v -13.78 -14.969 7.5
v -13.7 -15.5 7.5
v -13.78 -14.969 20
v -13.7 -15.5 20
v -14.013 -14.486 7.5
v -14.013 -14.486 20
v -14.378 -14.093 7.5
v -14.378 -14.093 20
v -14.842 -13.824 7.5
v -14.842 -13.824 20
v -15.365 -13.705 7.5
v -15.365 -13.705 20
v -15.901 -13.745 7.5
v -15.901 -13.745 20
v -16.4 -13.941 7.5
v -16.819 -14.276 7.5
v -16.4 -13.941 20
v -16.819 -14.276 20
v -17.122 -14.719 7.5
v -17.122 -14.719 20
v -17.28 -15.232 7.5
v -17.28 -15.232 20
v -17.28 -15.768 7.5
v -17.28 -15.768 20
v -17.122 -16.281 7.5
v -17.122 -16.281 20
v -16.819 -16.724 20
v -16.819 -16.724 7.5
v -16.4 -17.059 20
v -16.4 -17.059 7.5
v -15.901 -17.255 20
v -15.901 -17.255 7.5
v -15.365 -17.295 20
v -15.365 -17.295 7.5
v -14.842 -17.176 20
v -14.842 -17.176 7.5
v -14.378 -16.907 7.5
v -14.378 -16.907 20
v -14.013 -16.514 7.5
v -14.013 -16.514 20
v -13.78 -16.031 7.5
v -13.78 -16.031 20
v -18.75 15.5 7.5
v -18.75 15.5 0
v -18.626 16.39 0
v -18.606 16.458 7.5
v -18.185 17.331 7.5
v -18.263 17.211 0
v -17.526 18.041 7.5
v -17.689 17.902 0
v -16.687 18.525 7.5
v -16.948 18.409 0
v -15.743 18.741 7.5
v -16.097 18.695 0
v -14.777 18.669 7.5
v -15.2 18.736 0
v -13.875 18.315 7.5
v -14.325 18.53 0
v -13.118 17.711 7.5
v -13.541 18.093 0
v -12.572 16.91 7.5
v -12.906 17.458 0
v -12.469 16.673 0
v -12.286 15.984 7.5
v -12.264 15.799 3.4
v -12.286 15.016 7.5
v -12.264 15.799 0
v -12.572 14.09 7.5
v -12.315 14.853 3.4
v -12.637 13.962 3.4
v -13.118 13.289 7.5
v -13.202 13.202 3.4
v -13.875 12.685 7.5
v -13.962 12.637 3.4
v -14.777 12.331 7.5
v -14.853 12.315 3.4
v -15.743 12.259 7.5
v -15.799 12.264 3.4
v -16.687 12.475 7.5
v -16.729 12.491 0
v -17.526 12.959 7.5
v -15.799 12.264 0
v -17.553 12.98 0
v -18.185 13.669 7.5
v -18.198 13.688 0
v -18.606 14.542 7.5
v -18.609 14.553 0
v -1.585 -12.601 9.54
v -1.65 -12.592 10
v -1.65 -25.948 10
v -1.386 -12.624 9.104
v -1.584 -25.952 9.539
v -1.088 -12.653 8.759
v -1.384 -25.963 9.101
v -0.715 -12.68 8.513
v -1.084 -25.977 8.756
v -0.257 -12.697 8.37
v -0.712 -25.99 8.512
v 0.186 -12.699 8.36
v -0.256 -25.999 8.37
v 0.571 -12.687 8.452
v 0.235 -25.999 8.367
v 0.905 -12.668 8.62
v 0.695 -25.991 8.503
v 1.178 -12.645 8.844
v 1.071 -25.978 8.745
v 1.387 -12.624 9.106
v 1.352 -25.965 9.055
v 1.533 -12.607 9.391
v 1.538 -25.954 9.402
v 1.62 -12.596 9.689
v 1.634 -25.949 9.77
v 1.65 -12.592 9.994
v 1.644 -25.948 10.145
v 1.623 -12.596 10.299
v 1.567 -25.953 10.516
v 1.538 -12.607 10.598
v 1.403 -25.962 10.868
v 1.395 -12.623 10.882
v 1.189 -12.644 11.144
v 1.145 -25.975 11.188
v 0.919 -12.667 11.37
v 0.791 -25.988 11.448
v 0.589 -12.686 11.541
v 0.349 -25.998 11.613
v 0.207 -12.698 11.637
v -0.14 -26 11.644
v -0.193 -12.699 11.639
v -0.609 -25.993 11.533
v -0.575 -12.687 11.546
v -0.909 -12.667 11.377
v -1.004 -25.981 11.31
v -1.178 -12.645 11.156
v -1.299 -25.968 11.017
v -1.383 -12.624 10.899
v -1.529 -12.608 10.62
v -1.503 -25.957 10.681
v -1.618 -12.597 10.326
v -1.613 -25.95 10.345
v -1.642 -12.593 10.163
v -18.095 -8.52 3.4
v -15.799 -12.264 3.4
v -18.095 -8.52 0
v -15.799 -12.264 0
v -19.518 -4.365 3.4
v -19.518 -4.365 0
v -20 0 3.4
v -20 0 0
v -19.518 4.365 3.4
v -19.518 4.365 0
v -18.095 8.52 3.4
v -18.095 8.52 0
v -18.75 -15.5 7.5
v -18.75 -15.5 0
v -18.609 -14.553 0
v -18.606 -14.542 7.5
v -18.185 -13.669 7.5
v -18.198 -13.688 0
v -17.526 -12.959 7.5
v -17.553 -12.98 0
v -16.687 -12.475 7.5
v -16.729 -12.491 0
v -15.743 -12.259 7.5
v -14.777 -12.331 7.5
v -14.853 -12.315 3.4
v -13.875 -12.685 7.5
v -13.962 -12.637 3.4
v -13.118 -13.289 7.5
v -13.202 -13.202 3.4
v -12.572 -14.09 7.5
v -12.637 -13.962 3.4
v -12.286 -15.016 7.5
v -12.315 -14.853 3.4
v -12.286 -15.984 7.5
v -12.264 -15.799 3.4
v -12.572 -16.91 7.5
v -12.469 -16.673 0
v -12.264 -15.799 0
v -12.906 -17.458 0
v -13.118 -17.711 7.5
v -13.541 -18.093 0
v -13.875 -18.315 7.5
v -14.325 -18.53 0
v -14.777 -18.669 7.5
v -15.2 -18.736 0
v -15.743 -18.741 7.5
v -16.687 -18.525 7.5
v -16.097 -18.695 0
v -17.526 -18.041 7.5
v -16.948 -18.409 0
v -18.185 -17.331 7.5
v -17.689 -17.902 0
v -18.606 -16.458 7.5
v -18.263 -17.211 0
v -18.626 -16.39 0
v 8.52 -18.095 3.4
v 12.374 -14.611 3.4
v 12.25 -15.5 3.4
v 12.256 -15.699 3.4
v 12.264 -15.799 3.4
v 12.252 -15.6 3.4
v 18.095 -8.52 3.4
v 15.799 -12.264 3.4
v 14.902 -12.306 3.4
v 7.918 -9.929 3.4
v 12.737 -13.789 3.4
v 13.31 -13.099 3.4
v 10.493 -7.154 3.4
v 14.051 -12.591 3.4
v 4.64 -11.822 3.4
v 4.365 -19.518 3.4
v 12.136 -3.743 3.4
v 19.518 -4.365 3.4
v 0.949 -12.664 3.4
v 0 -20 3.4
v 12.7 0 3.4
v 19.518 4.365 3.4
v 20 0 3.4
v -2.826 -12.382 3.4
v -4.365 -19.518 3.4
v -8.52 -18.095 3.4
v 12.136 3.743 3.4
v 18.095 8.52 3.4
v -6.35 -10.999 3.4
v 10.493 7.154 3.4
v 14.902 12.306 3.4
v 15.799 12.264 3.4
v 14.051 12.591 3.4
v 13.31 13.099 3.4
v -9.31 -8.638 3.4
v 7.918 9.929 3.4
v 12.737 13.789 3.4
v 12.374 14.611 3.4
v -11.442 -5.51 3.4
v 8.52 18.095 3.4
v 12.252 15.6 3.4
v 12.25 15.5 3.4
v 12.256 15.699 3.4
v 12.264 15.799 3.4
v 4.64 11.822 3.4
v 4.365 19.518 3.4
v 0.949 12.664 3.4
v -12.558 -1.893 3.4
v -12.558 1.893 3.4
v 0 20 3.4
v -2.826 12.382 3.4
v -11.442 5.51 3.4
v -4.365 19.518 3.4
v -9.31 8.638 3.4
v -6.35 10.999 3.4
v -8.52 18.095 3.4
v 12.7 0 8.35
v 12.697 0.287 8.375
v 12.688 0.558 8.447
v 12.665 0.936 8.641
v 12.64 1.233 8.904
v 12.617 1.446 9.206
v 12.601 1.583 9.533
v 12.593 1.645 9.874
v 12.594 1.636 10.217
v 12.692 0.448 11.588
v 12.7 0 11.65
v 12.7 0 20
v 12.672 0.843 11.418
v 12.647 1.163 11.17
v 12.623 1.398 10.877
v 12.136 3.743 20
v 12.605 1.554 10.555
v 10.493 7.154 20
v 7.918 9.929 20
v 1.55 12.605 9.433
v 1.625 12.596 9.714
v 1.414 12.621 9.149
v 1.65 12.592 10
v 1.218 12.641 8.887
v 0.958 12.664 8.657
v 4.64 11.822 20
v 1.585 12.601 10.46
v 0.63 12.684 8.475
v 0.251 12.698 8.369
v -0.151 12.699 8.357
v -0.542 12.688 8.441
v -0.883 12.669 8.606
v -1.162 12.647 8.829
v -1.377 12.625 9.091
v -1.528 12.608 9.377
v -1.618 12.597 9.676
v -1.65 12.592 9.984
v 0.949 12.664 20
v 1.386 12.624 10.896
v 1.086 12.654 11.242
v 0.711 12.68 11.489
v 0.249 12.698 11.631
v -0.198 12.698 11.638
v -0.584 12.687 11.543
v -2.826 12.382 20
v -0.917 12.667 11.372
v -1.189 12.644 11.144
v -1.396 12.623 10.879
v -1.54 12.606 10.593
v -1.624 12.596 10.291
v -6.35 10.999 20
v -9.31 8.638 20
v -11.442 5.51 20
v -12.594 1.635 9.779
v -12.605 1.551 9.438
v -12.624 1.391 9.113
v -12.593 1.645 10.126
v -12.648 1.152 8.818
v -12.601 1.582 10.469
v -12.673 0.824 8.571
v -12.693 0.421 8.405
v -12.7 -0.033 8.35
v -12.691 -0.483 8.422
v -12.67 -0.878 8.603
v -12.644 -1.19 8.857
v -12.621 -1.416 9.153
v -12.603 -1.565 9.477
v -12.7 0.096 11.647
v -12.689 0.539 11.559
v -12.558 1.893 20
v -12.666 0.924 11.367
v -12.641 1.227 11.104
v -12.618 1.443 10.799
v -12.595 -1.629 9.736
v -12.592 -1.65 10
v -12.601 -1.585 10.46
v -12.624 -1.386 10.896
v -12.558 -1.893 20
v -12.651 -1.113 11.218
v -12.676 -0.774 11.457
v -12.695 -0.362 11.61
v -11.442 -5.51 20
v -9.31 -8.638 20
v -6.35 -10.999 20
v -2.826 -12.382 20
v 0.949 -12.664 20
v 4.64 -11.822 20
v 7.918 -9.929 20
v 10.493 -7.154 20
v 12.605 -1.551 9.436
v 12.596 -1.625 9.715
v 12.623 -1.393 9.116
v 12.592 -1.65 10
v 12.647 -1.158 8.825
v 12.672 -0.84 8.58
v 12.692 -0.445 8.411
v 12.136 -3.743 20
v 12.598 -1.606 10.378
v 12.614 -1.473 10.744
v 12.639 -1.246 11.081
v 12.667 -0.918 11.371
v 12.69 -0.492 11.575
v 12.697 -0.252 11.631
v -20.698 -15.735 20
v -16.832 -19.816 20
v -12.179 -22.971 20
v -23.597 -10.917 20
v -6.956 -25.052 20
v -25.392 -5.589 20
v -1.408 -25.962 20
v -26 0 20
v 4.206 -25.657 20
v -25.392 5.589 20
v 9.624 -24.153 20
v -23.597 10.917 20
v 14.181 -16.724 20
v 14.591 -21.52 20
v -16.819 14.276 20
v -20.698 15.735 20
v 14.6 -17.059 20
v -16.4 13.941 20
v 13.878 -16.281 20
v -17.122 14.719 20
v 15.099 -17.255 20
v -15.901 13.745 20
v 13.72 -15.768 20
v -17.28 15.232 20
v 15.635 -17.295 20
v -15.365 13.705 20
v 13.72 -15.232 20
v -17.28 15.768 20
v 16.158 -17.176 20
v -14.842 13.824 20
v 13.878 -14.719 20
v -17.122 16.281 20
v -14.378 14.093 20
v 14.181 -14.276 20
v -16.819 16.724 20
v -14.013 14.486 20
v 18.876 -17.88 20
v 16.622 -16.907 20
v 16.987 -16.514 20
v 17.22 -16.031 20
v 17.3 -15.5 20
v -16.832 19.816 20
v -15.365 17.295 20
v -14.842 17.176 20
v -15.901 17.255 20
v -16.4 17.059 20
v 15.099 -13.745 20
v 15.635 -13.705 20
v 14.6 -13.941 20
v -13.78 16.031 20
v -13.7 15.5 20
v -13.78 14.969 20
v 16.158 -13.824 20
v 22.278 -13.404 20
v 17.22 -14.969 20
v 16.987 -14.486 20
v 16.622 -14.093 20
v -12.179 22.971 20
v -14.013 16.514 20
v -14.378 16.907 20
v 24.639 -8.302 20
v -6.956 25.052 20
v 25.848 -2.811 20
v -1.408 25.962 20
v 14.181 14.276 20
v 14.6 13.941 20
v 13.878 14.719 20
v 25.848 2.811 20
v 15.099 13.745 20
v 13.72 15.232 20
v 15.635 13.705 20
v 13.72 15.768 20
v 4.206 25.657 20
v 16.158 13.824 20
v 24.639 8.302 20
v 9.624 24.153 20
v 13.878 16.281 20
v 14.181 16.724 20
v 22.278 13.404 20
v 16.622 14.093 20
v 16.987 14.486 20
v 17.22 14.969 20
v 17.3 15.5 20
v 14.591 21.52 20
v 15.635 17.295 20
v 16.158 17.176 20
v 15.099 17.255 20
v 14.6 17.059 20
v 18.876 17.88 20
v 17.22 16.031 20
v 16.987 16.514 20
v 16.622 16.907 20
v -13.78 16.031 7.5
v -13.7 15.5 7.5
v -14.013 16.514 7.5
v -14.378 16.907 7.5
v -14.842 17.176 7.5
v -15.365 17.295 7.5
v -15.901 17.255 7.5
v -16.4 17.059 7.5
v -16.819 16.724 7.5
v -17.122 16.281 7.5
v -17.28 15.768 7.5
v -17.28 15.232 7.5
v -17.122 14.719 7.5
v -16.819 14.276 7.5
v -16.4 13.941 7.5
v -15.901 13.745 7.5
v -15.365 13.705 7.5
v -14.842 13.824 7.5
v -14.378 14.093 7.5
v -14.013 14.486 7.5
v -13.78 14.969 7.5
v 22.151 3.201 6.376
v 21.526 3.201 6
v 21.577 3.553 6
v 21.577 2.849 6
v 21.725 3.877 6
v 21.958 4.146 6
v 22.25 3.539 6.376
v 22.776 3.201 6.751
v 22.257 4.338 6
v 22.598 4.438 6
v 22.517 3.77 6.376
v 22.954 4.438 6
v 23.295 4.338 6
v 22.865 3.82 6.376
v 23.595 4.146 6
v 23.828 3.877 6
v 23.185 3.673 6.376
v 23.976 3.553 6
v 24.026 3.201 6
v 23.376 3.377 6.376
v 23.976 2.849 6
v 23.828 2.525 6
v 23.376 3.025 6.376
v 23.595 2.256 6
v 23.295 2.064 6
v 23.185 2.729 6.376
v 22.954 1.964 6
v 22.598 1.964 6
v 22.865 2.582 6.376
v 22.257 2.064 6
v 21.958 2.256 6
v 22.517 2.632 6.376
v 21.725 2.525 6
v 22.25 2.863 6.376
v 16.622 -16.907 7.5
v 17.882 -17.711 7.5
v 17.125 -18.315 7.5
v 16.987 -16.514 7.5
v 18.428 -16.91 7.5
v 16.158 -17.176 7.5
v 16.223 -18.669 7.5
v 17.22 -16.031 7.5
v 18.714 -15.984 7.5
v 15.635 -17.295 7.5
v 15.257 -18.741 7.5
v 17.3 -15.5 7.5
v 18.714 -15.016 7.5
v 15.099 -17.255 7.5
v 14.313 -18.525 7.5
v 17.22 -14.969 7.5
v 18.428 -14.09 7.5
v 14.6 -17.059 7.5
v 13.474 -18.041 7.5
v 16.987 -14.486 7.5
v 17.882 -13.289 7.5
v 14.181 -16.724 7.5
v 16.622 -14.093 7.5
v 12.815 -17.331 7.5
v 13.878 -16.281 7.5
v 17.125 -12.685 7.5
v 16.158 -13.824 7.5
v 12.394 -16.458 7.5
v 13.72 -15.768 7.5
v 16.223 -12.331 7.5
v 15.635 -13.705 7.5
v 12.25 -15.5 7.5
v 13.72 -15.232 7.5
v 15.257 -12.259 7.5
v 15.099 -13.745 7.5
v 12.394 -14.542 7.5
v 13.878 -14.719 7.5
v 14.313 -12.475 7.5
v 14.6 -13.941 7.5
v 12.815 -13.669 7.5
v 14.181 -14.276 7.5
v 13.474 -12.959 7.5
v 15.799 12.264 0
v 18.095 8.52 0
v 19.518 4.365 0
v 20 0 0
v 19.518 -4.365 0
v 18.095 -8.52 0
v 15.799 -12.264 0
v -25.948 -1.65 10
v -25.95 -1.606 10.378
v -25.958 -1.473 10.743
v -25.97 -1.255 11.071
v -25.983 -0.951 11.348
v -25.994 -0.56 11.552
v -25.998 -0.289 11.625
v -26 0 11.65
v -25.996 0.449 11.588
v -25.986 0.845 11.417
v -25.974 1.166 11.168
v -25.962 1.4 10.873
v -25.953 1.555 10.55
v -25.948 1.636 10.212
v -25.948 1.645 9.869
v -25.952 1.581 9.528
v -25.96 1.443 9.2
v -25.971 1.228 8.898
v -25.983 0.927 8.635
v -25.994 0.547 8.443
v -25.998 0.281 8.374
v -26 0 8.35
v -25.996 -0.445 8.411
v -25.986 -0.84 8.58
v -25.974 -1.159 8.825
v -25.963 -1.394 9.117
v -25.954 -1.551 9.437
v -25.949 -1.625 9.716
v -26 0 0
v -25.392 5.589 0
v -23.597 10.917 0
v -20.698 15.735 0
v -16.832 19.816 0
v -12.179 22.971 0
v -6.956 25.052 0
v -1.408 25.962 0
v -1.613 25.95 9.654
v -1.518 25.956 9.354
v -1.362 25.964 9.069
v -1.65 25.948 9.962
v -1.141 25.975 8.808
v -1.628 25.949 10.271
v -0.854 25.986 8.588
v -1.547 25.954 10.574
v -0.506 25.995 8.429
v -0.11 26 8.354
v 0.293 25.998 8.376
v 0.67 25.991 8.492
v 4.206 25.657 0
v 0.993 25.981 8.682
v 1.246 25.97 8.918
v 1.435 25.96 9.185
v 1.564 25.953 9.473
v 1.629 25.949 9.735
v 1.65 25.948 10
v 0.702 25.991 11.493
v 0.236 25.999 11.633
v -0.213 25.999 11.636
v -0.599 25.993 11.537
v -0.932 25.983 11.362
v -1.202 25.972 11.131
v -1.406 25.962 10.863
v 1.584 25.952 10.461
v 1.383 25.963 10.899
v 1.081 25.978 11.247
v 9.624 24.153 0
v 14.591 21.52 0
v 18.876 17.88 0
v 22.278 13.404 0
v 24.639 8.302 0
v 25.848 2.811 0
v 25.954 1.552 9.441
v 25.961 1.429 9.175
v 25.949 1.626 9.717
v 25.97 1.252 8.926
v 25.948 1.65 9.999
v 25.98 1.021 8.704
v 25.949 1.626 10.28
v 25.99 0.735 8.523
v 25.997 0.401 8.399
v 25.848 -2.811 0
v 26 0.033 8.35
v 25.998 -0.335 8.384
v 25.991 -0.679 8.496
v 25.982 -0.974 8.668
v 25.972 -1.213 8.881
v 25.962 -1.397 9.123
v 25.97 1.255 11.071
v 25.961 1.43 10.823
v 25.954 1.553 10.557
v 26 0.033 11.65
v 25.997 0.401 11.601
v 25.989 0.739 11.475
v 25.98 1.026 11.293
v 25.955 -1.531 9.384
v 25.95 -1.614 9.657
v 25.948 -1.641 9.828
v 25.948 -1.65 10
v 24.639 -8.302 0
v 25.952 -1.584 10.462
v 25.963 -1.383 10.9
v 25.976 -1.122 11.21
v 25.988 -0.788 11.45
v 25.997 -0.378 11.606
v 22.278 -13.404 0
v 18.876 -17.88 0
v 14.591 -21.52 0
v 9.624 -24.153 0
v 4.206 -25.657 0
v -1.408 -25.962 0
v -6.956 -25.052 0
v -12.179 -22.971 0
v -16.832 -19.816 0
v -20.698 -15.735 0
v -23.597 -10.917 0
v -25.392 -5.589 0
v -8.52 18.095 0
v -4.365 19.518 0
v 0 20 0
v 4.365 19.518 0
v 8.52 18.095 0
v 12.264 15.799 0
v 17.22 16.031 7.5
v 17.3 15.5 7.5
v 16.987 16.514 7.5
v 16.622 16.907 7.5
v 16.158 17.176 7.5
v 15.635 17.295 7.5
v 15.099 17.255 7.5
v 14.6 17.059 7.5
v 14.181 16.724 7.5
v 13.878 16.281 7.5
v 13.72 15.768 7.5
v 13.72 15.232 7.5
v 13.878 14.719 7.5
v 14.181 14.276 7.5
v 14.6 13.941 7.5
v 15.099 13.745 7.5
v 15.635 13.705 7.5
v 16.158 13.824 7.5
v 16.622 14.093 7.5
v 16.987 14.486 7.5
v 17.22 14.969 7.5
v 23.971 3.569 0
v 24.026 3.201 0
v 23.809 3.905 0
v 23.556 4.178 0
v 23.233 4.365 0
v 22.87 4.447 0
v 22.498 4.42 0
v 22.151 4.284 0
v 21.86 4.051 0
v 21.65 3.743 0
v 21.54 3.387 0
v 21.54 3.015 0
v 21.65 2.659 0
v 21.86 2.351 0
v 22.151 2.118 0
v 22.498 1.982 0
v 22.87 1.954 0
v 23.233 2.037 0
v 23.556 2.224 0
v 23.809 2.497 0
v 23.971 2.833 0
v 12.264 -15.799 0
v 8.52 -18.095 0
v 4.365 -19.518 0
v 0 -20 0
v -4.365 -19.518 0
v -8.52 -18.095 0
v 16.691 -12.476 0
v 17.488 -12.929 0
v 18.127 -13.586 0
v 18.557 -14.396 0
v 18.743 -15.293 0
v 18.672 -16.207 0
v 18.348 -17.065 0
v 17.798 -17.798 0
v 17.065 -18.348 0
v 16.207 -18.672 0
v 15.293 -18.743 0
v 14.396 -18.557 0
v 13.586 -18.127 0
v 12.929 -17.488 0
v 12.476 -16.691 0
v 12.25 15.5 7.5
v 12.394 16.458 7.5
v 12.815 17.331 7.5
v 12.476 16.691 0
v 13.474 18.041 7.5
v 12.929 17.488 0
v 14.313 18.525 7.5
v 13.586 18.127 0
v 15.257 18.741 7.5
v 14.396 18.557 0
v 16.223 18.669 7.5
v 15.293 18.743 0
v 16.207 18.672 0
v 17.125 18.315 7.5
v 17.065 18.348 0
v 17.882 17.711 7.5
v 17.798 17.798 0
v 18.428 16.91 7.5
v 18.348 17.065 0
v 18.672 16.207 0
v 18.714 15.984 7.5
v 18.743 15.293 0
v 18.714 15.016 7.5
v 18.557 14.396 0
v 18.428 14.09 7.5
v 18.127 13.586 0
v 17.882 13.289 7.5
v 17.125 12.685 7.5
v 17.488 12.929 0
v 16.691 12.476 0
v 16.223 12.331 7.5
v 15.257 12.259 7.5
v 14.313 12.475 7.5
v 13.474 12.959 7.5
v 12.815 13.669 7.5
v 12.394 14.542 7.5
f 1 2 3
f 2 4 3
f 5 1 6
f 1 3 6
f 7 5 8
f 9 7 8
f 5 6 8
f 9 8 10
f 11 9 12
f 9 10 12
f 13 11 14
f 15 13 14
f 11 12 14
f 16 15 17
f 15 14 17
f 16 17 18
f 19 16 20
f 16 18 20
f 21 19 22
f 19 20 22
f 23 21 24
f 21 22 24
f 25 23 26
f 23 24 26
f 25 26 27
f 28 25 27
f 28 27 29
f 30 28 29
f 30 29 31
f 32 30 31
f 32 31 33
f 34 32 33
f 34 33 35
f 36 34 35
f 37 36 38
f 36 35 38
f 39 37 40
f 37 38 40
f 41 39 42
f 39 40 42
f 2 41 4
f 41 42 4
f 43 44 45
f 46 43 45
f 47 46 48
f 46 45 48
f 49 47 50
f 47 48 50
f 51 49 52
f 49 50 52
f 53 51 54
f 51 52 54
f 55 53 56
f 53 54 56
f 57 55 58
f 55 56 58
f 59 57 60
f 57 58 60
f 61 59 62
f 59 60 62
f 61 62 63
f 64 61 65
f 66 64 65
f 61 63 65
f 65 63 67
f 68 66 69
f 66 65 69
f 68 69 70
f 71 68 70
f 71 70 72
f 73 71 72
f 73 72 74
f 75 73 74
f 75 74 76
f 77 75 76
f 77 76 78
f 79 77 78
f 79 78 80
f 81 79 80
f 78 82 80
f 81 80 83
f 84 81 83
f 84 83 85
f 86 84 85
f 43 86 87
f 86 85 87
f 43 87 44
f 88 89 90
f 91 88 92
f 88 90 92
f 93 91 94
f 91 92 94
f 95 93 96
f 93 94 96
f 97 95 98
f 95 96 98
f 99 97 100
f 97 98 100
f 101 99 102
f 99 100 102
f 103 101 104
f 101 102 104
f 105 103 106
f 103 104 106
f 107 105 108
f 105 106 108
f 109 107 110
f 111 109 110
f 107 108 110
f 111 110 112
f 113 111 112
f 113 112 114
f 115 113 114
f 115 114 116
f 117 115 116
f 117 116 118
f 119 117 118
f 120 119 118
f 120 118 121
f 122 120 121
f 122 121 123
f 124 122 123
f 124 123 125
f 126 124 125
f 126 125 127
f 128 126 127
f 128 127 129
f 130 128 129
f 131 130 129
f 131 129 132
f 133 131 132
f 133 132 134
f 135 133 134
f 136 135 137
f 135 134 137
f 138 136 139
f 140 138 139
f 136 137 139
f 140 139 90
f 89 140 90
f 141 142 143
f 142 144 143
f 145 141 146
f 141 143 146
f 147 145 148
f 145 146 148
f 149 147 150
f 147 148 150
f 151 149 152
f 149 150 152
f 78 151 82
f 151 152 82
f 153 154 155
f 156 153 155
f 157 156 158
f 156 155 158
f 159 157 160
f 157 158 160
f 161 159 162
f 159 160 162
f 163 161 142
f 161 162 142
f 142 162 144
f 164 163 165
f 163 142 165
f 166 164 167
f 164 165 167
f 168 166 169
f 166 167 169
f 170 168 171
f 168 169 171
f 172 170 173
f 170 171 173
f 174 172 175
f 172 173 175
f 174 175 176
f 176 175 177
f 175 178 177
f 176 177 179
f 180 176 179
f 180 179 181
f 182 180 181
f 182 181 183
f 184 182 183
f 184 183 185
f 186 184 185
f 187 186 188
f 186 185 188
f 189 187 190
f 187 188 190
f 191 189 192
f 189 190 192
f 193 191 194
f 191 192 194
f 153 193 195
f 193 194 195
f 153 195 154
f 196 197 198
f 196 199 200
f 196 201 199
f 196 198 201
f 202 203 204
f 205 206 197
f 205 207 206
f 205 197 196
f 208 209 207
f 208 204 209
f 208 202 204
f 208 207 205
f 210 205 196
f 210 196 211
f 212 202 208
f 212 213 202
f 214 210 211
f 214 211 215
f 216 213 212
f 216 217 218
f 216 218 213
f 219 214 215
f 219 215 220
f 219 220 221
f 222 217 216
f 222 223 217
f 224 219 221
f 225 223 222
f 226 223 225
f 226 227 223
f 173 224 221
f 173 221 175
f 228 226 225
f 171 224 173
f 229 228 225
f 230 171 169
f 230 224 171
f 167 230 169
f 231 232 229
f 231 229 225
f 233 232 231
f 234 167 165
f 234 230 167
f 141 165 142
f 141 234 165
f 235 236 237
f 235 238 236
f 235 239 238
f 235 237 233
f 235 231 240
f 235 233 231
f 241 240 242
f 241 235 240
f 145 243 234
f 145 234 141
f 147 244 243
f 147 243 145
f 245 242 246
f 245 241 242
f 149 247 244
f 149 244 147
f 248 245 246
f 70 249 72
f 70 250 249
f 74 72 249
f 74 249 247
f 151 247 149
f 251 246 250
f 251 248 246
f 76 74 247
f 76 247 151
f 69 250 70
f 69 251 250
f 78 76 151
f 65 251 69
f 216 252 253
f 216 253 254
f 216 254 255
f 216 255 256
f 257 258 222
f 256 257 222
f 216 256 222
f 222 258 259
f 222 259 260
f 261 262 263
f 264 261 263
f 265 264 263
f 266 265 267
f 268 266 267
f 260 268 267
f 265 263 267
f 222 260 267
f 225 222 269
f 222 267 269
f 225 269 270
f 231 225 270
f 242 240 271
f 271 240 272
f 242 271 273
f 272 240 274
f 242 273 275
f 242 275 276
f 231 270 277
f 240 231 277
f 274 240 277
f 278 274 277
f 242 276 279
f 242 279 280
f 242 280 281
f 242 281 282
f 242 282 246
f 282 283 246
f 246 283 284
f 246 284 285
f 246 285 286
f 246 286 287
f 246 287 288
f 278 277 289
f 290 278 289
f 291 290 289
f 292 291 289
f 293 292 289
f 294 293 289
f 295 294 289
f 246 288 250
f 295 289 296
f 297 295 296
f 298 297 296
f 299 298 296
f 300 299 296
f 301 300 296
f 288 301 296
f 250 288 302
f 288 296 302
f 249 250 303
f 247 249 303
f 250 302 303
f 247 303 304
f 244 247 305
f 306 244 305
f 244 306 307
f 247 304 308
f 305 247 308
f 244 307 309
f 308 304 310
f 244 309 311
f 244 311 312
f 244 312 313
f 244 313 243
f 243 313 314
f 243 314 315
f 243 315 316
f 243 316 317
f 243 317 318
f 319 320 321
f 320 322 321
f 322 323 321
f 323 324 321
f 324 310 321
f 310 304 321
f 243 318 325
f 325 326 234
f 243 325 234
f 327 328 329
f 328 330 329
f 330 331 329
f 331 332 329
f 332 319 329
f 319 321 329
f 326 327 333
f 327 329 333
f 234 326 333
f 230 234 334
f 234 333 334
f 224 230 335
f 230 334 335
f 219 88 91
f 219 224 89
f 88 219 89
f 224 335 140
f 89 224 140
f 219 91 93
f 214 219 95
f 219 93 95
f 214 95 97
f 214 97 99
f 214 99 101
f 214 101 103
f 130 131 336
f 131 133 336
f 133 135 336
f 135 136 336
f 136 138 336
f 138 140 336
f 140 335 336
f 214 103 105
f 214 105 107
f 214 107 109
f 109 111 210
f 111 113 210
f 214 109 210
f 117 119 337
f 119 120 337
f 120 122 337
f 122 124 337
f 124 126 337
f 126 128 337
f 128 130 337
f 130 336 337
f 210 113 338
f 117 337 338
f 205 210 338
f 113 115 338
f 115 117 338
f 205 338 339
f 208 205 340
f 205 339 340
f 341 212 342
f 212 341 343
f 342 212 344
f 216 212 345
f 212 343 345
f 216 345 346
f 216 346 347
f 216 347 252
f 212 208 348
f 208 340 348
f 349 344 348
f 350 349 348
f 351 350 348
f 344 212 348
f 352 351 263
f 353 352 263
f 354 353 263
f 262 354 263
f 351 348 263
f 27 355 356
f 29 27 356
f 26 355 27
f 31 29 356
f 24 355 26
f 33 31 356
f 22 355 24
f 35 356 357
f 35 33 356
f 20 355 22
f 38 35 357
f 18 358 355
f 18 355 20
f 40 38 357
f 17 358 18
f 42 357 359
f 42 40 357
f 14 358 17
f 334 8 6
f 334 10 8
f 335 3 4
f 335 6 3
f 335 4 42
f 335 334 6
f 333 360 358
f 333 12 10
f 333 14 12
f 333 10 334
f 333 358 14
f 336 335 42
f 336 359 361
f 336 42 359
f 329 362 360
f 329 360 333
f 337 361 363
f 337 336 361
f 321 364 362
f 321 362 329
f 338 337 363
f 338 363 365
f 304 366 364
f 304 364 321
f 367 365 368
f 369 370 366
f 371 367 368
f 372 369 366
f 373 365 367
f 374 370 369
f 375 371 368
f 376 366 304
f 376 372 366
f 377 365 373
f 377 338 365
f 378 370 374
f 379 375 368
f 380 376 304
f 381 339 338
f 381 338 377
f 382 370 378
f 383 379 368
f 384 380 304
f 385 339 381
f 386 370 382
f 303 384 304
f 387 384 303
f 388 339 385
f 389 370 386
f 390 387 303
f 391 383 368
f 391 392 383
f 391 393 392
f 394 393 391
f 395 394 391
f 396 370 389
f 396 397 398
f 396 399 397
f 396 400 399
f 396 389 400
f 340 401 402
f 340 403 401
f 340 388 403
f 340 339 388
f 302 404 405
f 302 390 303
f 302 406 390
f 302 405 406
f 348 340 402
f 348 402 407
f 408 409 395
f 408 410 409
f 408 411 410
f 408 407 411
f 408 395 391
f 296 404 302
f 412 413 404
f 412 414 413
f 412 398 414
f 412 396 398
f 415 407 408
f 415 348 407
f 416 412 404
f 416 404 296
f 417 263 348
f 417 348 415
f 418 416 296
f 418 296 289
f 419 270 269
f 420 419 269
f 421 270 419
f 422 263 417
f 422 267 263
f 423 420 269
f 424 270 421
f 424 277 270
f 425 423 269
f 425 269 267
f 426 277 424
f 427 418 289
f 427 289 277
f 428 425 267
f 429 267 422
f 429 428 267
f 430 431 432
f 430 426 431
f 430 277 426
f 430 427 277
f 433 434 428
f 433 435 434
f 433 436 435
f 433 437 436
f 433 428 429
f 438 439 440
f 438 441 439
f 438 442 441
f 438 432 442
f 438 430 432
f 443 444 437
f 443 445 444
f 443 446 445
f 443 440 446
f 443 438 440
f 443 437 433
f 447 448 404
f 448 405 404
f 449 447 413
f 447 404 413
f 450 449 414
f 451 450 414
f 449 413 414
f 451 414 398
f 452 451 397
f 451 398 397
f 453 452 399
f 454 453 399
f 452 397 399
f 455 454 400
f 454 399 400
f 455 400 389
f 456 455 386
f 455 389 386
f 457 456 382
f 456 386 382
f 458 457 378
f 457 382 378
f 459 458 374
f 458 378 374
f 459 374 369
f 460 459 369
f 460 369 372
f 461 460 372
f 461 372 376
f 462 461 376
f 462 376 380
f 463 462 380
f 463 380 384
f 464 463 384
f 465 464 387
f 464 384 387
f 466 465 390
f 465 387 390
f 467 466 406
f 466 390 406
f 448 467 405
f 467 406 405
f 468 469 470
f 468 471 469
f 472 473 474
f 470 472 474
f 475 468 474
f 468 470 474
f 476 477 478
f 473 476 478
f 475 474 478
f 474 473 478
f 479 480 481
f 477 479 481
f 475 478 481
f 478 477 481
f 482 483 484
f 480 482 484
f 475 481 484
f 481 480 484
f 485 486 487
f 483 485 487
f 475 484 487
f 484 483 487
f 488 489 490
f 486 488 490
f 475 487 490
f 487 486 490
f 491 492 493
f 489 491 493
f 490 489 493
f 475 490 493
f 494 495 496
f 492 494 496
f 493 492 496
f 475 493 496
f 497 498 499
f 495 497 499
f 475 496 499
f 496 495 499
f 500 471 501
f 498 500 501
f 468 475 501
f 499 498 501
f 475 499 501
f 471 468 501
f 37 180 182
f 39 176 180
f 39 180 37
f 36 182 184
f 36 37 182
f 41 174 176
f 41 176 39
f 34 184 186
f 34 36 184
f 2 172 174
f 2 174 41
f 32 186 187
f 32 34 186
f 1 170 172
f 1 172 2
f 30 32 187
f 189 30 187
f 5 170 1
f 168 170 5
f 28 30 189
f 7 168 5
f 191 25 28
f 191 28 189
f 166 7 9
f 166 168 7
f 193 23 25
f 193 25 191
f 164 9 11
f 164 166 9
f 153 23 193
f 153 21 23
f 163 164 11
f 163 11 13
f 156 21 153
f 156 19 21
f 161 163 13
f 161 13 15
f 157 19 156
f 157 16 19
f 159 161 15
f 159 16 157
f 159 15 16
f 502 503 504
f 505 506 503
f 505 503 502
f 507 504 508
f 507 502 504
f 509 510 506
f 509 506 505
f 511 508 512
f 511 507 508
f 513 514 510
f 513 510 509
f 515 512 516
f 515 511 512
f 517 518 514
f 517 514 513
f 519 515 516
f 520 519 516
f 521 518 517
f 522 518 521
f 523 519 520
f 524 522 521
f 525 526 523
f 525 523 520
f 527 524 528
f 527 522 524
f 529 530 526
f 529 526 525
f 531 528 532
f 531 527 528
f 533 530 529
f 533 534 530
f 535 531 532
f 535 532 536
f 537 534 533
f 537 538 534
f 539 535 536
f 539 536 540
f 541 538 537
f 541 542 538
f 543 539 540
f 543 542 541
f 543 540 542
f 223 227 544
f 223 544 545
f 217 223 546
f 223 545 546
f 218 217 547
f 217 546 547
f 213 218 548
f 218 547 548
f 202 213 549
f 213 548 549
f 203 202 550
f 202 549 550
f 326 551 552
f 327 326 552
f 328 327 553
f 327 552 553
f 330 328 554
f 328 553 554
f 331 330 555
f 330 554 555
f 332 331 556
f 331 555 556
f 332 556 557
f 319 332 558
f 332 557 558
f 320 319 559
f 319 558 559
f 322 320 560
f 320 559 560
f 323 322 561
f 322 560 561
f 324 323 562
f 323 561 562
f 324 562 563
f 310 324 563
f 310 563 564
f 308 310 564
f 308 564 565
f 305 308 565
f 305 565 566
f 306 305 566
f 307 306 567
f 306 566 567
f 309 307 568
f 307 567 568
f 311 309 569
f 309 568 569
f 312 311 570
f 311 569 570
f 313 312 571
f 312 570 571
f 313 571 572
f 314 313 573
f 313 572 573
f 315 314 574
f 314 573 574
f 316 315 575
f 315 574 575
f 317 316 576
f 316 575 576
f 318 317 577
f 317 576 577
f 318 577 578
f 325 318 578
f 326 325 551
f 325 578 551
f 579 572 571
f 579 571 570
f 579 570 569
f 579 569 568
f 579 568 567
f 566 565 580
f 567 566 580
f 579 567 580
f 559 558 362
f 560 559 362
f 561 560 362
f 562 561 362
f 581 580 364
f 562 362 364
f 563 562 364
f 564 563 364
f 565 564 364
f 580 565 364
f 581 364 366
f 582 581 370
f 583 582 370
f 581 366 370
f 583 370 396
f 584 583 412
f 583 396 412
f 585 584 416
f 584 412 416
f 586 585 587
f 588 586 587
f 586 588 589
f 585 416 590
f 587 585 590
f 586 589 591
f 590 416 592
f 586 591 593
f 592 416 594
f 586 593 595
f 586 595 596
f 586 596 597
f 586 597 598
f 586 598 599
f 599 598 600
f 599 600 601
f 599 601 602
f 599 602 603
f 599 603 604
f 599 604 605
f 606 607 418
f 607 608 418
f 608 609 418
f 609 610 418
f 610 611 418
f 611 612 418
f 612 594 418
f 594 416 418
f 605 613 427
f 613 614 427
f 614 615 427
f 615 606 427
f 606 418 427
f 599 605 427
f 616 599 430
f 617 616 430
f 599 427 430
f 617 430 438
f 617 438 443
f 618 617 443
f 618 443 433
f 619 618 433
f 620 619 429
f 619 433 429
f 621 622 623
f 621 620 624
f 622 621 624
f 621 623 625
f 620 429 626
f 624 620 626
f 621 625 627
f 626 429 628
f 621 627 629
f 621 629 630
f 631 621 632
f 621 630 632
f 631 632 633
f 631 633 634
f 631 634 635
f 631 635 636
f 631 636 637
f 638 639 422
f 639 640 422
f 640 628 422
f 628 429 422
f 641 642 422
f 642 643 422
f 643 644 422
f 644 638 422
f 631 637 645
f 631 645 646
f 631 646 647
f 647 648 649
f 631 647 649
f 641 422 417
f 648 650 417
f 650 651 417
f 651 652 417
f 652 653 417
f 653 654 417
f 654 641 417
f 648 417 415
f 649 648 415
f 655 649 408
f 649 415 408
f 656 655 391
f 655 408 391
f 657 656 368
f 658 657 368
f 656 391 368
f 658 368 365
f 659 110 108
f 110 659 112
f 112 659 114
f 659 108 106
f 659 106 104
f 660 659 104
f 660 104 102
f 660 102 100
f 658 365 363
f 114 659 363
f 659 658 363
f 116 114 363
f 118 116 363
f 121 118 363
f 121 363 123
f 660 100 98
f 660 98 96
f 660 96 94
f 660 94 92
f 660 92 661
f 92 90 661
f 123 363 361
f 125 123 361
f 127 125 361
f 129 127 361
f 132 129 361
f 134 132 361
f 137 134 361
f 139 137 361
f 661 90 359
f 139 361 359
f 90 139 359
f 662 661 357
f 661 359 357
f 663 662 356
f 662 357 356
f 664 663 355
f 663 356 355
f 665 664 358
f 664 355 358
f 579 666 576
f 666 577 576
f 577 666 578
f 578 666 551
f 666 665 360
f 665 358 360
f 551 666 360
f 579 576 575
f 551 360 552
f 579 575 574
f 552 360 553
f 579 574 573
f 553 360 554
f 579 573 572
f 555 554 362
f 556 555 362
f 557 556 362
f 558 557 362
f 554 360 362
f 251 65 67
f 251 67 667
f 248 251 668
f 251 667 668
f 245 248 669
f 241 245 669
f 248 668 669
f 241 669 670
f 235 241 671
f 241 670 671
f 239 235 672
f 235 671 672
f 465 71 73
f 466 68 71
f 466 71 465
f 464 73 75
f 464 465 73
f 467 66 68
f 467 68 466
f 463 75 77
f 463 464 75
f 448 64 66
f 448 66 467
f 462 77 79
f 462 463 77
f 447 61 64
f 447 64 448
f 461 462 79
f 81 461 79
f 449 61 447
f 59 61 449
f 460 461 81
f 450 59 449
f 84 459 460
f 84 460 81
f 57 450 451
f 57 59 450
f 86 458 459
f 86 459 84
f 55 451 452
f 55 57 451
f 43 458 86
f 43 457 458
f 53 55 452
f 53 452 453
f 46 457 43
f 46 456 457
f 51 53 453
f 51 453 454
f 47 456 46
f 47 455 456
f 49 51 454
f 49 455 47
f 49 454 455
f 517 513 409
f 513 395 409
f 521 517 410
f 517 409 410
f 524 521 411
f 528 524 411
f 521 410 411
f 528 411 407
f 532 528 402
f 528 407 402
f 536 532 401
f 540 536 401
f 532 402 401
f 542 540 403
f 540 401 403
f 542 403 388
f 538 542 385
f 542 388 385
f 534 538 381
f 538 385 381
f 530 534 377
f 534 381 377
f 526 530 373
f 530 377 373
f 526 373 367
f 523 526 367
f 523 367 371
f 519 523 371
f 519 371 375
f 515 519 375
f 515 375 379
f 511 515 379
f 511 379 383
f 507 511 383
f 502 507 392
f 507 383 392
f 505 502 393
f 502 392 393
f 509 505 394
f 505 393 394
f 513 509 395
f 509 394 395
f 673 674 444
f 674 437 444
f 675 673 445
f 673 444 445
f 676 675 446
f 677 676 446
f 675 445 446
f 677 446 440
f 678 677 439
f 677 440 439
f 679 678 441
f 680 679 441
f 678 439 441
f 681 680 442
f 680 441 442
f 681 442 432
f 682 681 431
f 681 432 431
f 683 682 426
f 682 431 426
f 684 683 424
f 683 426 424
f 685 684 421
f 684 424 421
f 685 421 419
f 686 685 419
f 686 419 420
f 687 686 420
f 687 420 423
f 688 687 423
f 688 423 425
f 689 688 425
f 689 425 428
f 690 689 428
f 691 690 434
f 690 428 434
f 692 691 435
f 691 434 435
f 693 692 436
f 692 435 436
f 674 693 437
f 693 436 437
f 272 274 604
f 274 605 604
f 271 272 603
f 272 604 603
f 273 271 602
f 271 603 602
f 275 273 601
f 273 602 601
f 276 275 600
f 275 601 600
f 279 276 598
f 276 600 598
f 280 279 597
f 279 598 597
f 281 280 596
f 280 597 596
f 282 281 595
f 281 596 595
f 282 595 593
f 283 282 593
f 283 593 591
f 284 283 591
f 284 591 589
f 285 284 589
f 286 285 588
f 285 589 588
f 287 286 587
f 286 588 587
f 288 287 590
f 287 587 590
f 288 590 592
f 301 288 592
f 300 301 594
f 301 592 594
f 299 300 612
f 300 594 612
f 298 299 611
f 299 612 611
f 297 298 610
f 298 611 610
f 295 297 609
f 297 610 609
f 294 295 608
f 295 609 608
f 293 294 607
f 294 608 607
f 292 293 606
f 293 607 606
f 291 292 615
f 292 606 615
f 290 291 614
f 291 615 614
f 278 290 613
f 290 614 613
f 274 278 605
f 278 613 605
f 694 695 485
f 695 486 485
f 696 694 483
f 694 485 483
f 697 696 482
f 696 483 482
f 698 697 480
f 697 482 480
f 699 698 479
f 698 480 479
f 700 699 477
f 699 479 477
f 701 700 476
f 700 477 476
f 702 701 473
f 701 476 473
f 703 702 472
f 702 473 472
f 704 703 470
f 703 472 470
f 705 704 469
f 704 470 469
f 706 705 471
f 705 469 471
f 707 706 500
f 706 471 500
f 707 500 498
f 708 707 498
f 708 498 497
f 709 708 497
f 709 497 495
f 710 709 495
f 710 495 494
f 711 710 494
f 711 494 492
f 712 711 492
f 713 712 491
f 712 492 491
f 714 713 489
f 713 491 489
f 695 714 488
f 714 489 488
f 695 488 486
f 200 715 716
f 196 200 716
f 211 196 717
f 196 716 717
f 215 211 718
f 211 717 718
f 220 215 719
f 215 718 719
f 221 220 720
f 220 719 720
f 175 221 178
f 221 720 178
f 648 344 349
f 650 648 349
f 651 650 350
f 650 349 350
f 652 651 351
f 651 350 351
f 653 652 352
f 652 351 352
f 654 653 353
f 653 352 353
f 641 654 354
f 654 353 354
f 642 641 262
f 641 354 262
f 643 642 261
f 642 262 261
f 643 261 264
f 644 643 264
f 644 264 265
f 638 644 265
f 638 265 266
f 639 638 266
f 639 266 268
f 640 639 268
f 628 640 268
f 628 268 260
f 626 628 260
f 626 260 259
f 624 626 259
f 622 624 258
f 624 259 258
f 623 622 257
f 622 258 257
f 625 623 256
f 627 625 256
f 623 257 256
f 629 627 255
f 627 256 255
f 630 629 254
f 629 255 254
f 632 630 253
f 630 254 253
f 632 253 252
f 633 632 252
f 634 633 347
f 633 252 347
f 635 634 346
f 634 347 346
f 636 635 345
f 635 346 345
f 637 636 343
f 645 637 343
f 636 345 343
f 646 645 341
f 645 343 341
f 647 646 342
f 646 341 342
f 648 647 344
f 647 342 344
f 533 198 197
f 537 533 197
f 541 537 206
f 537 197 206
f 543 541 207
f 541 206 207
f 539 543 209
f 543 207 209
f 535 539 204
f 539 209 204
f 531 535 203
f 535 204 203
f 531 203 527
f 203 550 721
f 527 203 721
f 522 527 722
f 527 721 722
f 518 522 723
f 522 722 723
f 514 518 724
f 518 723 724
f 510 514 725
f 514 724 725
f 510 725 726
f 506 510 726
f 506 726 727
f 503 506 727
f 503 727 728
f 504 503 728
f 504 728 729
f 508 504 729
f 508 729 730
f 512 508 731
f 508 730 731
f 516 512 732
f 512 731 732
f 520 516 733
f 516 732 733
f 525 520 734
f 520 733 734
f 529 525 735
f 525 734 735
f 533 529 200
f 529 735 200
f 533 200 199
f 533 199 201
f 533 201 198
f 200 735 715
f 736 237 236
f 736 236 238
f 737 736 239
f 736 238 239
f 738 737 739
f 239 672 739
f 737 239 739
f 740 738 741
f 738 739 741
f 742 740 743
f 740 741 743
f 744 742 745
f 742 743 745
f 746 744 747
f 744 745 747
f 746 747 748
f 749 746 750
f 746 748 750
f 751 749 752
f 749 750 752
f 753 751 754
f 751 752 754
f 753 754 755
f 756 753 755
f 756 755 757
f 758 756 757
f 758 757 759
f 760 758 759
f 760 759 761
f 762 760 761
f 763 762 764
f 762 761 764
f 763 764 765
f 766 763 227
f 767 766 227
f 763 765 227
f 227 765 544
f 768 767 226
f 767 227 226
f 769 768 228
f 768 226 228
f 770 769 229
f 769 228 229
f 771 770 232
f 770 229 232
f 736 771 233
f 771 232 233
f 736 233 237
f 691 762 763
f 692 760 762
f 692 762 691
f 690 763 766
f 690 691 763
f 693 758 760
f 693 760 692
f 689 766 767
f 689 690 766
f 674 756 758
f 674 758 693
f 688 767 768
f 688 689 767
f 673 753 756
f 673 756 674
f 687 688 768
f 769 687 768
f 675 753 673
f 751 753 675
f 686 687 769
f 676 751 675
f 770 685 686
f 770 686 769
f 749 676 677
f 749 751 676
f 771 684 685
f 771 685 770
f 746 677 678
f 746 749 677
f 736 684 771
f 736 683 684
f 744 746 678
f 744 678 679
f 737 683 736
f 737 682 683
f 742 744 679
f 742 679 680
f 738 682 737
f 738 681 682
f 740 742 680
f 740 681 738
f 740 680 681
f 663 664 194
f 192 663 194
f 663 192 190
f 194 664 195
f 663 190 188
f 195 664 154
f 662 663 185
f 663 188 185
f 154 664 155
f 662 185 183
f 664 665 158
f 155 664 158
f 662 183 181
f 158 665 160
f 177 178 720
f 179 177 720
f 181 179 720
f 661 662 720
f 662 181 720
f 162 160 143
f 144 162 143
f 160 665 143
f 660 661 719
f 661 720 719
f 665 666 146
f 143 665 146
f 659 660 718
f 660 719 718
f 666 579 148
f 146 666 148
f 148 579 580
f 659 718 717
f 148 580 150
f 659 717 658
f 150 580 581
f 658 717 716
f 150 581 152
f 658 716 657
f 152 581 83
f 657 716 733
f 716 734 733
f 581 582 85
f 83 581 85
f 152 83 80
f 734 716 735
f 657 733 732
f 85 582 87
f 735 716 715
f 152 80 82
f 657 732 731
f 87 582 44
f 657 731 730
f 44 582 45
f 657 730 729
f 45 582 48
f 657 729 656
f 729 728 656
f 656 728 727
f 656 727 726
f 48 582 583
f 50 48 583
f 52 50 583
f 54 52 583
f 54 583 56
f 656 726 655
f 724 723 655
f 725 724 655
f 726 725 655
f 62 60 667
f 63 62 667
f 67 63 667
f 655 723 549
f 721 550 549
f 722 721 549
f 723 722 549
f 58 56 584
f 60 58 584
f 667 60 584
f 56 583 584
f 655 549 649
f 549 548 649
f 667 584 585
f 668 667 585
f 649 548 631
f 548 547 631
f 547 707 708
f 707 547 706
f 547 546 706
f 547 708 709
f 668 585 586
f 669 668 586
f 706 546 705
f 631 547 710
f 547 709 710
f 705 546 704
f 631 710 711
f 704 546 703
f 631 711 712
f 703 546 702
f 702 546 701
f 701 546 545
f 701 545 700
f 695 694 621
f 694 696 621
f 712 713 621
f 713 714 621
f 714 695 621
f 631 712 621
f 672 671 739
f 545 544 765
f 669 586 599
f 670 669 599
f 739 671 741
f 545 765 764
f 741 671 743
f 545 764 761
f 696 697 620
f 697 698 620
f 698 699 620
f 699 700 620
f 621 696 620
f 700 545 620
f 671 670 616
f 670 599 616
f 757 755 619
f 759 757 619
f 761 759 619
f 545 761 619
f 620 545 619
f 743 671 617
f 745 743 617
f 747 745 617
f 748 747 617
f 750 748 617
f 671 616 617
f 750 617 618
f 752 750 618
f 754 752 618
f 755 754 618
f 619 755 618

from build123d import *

# Parameters (mm, degrees)
SKETCH1_W                      = 26
SKETCH1_H                      = 20
M3X0_5_TAPPED_HOLE1_D          = 2.5
M3X0_5_TAPPED_HOLE1_DEPTH      = 6
M3X0_5_TAPPED_HOLE1_TIP        = 0.751075774
HOLE1_D                        = 25.4
HOLE1_CBORE_D                  = 40
HOLE1_CBORE_DEPTH              = 3.4
M4X0_7_TAPPED_HOLE1_D          = 3.3
M4X0_7_TAPPED_HOLE2_D          = 3.3
M4X0_7_TAPPED_HOLE2_DEPTH      = 13.407641206
F_4_CLEARANCE_HOLE3_D          = 3.3
CBORE_FOR_M3_SHCS1_D           = 3.6
CBORE_FOR_M3_SHCS1_CBORE_D     = 6.5
CBORE_FOR_M3_SHCS1_CBORE_DEPTH = 7.5


with BuildPart() as part:
    # Sketch1 → Revolve1 (revolve)
    with BuildSketch(Plane.XZ, mode=Mode.PRIVATE) as revolve1_sk:
        with Locations((13, 10)):
            Rectangle(SKETCH1_W, SKETCH1_H)
    revolve(revolve1_sk.sketch.rotate(Axis((0, 0, 20), (0, 0, -1)), 180), axis=Axis((0, 0, 20), (0, 0, -1)))

    # M3x0.5 Tapped Hole1
    with Locations(Plane(origin=(0, 0, 0), x_dir=(-1, 0, 0), z_dir=(0, 0, -1))):
        with Locations((-22.776165581, 3.200981322)):
            Hole(M3X0_5_TAPPED_HOLE1_D / 2, depth=M3X0_5_TAPPED_HOLE1_DEPTH)
            with Locations((0, 0, -(M3X0_5_TAPPED_HOLE1_DEPTH + M3X0_5_TAPPED_HOLE1_TIP / 2))):  # 118° drill point
                Cone(0, M3X0_5_TAPPED_HOLE1_D / 2, M3X0_5_TAPPED_HOLE1_TIP, mode=Mode.SUBTRACT)

    # Hole1 (through all)
    with Locations(Plane(origin=(0, 0, 0), x_dir=(-1, 0, 0), z_dir=(0, 0, -1))):
        with Locations((0, 0)):
            CounterBoreHole(HOLE1_D / 2, HOLE1_CBORE_D / 2, HOLE1_CBORE_DEPTH)

    # M4x0.7 Tapped Hole1 (through all)
    with Locations(Plane(origin=(26, 0, 10), x_dir=(0, 1, 0), z_dir=(1, 0, 0))):
        with Locations((0, 0)):
            Hole(M4X0_7_TAPPED_HOLE1_D / 2)

    # M4x0.7 Tapped Hole2
    with Locations(Plane(origin=(0, 12.592358794, 0), x_dir=(-1, 0, 0), z_dir=(0, -1, 0))):
        with Locations((0, -10)):
            Hole(M4X0_7_TAPPED_HOLE2_D / 2, depth=M4X0_7_TAPPED_HOLE2_DEPTH)

    # #4 Clearance Hole3 (through all)
    with Locations(Plane(origin=(0, -12.592358794, 0), x_dir=(1, 0, 0), z_dir=(0, 1, 0))):
        with Locations((0, -10)):
            Hole(F_4_CLEARANCE_HOLE3_D / 2)

    # CBORE for M3 SHCS1 (through all)
    with Locations(Plane(origin=(0, 0, 0), x_dir=(-1, 0, 0), z_dir=(0, 0, -1))):
        with Locations((-15.5, -15.5), (-15.5, 15.5), (15.5, 15.5), (15.5, -15.5)):
            CounterBoreHole(CBORE_FOR_M3_SHCS1_D / 2, CBORE_FOR_M3_SHCS1_CBORE_D / 2, CBORE_FOR_M3_SHCS1_CBORE_DEPTH)


solid = part.part
